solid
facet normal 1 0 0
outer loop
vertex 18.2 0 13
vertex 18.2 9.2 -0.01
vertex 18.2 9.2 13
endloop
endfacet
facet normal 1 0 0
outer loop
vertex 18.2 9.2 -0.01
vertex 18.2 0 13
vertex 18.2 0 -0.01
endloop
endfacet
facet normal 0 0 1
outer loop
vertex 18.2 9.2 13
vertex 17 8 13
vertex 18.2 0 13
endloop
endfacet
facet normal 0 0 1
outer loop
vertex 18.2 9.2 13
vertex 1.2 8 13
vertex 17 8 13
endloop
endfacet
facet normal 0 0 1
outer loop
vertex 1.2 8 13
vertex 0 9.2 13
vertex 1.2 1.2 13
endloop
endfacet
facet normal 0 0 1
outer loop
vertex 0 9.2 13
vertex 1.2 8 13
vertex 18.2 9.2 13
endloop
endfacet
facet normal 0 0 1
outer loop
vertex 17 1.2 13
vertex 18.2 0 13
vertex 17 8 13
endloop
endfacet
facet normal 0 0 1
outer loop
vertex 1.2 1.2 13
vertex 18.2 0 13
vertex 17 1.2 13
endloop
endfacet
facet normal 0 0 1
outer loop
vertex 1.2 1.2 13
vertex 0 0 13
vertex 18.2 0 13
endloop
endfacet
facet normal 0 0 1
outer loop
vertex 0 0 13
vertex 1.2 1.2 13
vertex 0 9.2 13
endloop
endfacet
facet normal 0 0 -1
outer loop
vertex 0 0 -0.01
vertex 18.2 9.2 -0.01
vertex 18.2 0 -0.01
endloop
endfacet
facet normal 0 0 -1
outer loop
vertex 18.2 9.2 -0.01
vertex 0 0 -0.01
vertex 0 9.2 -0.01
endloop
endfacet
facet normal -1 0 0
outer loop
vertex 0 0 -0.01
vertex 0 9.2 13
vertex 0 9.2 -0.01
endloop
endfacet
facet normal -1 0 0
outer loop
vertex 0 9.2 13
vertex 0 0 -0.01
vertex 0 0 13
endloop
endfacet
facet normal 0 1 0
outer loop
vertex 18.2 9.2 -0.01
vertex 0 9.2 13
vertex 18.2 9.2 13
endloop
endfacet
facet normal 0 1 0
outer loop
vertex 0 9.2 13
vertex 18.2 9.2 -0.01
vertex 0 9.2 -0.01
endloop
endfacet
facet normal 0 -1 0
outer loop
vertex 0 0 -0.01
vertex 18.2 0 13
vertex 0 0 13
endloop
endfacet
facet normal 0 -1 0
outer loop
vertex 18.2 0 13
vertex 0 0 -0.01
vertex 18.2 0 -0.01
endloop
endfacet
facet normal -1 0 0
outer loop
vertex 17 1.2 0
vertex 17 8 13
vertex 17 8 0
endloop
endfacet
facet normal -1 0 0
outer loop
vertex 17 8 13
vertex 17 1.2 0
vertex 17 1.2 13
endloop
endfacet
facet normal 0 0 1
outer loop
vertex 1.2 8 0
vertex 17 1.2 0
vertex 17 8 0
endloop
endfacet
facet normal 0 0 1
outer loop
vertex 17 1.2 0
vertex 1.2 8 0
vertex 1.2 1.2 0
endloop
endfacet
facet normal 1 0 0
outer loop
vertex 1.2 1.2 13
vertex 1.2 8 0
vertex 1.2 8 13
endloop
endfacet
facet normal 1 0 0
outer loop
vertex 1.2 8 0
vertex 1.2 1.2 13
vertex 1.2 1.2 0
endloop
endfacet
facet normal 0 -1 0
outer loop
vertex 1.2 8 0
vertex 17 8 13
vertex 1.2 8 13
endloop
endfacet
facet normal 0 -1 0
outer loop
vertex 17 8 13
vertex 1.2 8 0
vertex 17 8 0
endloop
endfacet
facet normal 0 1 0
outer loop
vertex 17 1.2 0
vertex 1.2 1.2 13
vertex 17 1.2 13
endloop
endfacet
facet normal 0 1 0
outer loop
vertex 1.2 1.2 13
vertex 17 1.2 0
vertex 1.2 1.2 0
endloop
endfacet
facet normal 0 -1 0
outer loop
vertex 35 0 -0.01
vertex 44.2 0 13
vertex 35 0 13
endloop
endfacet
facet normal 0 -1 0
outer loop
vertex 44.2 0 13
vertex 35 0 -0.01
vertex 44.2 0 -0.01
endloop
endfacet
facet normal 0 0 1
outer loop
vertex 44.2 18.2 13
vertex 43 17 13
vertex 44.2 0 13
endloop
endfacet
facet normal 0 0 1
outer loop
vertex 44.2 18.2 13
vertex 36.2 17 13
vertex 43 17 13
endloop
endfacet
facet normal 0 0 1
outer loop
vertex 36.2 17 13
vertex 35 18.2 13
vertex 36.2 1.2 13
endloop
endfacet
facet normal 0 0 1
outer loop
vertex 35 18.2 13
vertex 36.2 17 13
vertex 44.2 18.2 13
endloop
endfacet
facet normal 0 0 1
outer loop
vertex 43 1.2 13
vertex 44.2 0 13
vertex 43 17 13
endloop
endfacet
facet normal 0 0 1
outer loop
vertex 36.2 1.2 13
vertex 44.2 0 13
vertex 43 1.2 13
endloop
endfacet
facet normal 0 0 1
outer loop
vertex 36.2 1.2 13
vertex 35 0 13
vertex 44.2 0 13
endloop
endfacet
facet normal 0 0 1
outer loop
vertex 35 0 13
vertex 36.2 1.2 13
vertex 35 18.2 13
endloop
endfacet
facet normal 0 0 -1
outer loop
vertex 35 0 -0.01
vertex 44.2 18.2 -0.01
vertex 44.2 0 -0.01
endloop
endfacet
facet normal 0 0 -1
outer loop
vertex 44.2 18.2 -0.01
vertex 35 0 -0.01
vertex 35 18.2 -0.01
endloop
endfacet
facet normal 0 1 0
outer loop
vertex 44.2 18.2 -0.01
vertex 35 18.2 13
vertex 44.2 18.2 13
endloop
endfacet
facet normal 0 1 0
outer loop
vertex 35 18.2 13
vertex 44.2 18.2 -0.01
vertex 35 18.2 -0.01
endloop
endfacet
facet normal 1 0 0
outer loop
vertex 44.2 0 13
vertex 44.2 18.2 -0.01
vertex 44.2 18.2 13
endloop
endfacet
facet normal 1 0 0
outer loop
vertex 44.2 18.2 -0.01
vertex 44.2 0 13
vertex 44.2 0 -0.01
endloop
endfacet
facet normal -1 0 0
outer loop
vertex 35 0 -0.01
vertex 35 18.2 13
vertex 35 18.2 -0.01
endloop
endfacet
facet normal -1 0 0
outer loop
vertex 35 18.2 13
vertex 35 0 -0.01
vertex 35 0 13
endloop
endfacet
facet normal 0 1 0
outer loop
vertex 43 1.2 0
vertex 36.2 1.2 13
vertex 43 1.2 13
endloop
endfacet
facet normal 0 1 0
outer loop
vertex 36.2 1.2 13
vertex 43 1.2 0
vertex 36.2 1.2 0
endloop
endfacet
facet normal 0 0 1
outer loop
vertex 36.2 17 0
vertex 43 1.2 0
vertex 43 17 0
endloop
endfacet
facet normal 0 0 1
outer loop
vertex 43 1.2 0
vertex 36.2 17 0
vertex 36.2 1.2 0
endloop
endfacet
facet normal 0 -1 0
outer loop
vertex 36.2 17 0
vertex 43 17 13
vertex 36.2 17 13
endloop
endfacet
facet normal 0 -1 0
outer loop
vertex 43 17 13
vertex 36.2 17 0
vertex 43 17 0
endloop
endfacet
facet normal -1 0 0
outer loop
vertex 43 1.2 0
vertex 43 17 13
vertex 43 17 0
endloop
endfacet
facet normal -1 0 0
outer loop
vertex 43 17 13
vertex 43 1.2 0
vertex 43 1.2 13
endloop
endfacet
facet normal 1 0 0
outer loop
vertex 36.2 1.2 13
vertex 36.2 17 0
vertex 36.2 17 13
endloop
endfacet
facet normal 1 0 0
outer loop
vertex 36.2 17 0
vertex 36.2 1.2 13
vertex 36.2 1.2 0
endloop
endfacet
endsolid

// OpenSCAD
// file: ../../Base/Boxes.scad
// Fischertechnik Box Foundation
// Pre-designed Boxes

use <Constants.scad>

include <PlacementOptions.scad>

box190Width = 190;
box190Depth = 130;
box130Width = 130;
box130Depth = 95;
boxUsageHeight = 33.9;
boxWallThickness = 2.4;
boxBaseThickness = 1.0;

// getBoxWallThickness()
// Gets the wall thickness of a Fischertechnik Box

function getBoxWallThickness() = boxWallThickness;

// Gets the usable height of a fischertechnik box
function getBoxUsageHeight() = boxUsageHeight;

// Gets the thickness of the Fischertechnik box base.
function getBoxBaseThickness() = boxBaseThickness;

// Gets the usable inner space of a Box 190 as an x/y-list
function getBox190Space() = [
    box190Width - 2*getBoxWallThickness(), 
    box190Depth - 2*getBoxWallThickness() ];

// Imports the Fischertechnik empty box 130x190 mm and places it at position 0,0
// 190x130 are the outer sizes, the inner space is slightly smaller. Use getBox190Space() to get the inner sizes.
// This module needs the STL file "Fischertechnik Box 130x190.stl" in the library path.
// The box is positioned that the usable inner space is at the 0,0,0 position. The

module Box190() {
    translate([-getBoxWallThickness(),-getBoxWallThickness(),-getBoxBaseThickness()])
        import("Fischertechnik Box 130x190.stl", convexity=3);
}

// Gets the usable inner space of a Box 130 as an x/y-list
function getBox130Space() = [
    box130Width - 2*getBoxWallThickness(), 
    box130Depth - 2*getBoxWallThickness() ];

// Imports the Fischertechnik empty box 95x130 mm and places it at position 0,0
// 190x130 are the outer sizes, the inner space is slightly smaller. Use getBox190Space() to get the inner sizes.
// This module needs the STL file "Fischertechnik Box 95x130.stl" in the library path.
// The box is positioned that the usable inner space is at the 0,0,0 position. The

module Box130() {
    translate([-getBoxWallThickness(),-getBoxWallThickness(),-getBoxBaseThickness()])
        import("Fischertechnik Box 95x130.stl", convexity=3);
}

// Creates a web at the specified box walls
// corner 0 = LowerLeft, 1 = UpperLeft, 2 = UpperRight, 3 = LowerRight
// side 0 = LeftOfCorner, 1 = RightOfCorner
// distance = Distance in mm from the corner
// box = inner width and depth of the box (default: Box 190)
// webWidth = length of the web (default is 3 mms)
// webThickness = thickness of the web (default is 1 mm)

module BoxWeb(corner, side, distance, box=getBox190Space(), webWidth=3, webThickness=1.0) {
    sink = getBoxWallThickness()/2;

    width = (corner % 2 == 0) ? 
            (side == LeftOfCorner ? webWidth : webThickness) :
            (side == LeftOfCorner ? webThickness : webWidth);

    depth = (corner % 2 == 0) ? 
            (side == RightOfCorner ? webWidth : webThickness) :
            (side == RightOfCorner ? webThickness : webWidth);
    
    xDiff = corner == LowerLeft ? 
                (side == LeftOfCorner ? -sink : distance) :
            (corner == UpperLeft ?                
                (side == LeftOfCorner ? distance : -sink) :
            (corner == UpperRight ?
                (side == LeftOfCorner ? box.x-webWidth+sink : box.x-distance-webThickness) :
                (side == LeftOfCorner ? box.x-distance-webThickness: box.x-webWidth+sink)));

    yDiff = corner == LowerLeft ? 
                (side == RightOfCorner ? -sink : distance) :
            (corner == UpperLeft ?
                (side == RightOfCorner ? box.y-distance : box.y-webWidth+sink) :
            (corner == UpperRight ?
                (side == RightOfCorner ? box.y-webWidth+sink : box.y-distance) :
                (side == RightOfCorner ? distance : -sink)));
    
    translate([xDiff, yDiff, -getExcess()])
        cube([width, depth, boxUsageHeight + 2*getExcess()]);
}
// file: ../../Base/Rotation.scad
// Fischertechnik Box Foundation
// Geometry Helpers Rotation

include <PlacementOptions.scad>

// getRotatedSpace(space, rotation=NoRotation)
// Rotates the space dependent on the specified rotation

function getRotatedSpace(space, rotation=NoRotation) = [
    (rotation == Rotate90 || rotation == Rotate270) ? space.y : space.x,
    (rotation == Rotate90 || rotation == Rotate270) ? space.x : space.y
];

// Rotates the given space around the fixed left lower corner
// space = the space the children needs as width/depth list [width,depth]
// rotation = 0 Rotate0 degrees, 1 Rotate90 degrees, 2 Rotate180 degrees, 3 Rotate270 degrees (equivalent to -90)

module RotateFix(space, rotation=Rotate0) {
    dy = (rotation == Rotate0 || rotation == Rotate270) ? 0 :
        (rotation == Rotate90) ? space.x :
        space.y;
    dx = (rotation < Rotate180) ? 0 :
        (rotation == Rotate180) ? space.x :
        space.y;
    
    translate([dx, dy, 0])
        rotate([0, 0, rotations[rotation]])
            children();
}
// file: ../../Base/Alignment.scad
// Fischertechnik Box Foundation
// Geometry Helpers Alignment

include <PlacementOptions.scad>

// getAlignedX(elementWidth, spaceWidth, align=AlignRight, offset=0)
// Gets the aligned X offset of an element with the given
// width in the given space.
// elementWidth = The width of the element to positon
// spaceWidth = The space where the element should be aligned
// align = 0 AlignLeft, 1 AlignCenter, 2 AlignRight
// offset = an optional offset from the aligned position. When
// aligned left or centered, then positive values are in X direction.
// When aligned right then positive values are in negative X direction.

function getAlignedX(elementWidth, spaceWidth, align=AlignRight, offset=0) =
    (align == AlignLeft) ?
        offset :
        ((align == AlignCenter) ?
        (spaceWidth - elementWidth)/2 + offset :
        spaceWidth - offset - elementWidth);

// getAlignedY(elementDepth, spaceDepth, align=AlignTop, offset=0)
// Gets the aligned Y offset of an element with the given
// depth in the given space.
// elementDepth = The depth of the element to positon
// spaceDepth = The space where the element should be aligned
// align = 0 AlignBottom, 1 AlignCenter, 2 AlignTop
// offset = an optional offset from the aligned position. When
// aligned bottom or centered, then positive values are in Y direction.
// When aligned top then positive values are in negative Y direction.

function getAlignedY(elementDepth, spaceDepth, align=AlignTop, offset=0) =
    (align == AlignBottom) ?
        offset :
        ((align == AlignCenter) ?
        (spaceDepth - elementDepth)/2 + offset :
        spaceDepth - offset - elementDepth);
// file: ../../Base/Constants.scad
// Fischertechnik Box Foundation
// Constants

// Constant values necessary for multiple elements

// Base constants
dividerThickness = 1.2;
excess = 0.01;
fragments = 90;
tolerance = 0.8;

// Gets the thickness of a divider 
function getDividerThickness() = dividerThickness;

// Gets the excess that is used to merge walls into each other
function getExcess() = excess;

// Gets amount of fragments of a cylinder
function getFragments() = fragments;

// Gets the inner tolerance of a frame to each side
function getTolerance() = tolerance;


// Fischertechnik specific constants
axisDiameter = 4;
axisBottomDiameter = axisDiameter + 1;
standardEdgeDistance = 2.5;
standardWebDistance = 11.5;
standardCornerLength = 15;
tubeWallFactor = 1.6;

// Gets axis diameter
function getAxisDiameter() = axisDiameter;

// Gets axis bottom diameter for thicker part at the bottom
function getAxisBottomDiameter() = axisBottomDiameter;

// gets the standard distance to the wall of the box for dockable frames with webs
function getStandardEdgeDistance() = standardEdgeDistance;

// gets the standard distance of each web to the corner of the dockable frame
function getStandardWebDistance() = standardWebDistance;

// gets the standard length of the corner walls of a dockable frame
function getStandardCornerLength() = standardCornerLength;

// gets the wall thickness of a tube.
function getTubeWallThickness() = tubeWallFactor * getDividerThickness();
// file: ../../Base/PlacementOptions.scad
// Fischertechnik Box Foundation
// Placement Options

// Alignment
NoAlign = 0;
AlignLeft = 1;
AlignBottom = 2;
AlignCenter = 3;
AlignRight = 4;
AlignTop = 5;

// Element rotation degree steps
rotations = [0, -90, -180, -270];

// Rotation
NoRotation = 0;
Rotate0 = 0;
Rotate90 = 1;
Rotate180 = 2;
Rotate270 = 3;

// Docking (seen from above)
NoDock = -1;
DockLeft = 0;
DockTop = 1;
DockRight = 2;
DockCorner = 2;
DockBottom = 3;

// Web corners
LowerLeft = 0;
UpperLeft = 1;
UpperRight = 2;
LowerRight = 3;

// Web position relative to corner
LeftOfCorner = 0;
RightOfCorner = 1;
// file: ../../Elements/FramePluggedCapacitor.scad
// Fischertechnik Box Library
// Frame for Plugged Capacitor (two plugs)
// 36387

use <../ModelBase/Simple.scad>

width = 15;
depth = 6;
height = 13;

// getFramePluggedCapacitorSpace()
// Gets the space the frame for a plugged capacitor needs as width and depth (.x and .y as a list)

function getFramePluggedCapacitorSpace() = getFrameOuterVolume([width, depth, height]);

// FramePluggedCapacitor()
// The walls of the frame are 13 mm high. 
// The complete frame has a tolerance of addition 1 mm in each direction.

module FramePluggedCapacitor() {
    Frame([width, depth, height]);
}

// Tests
color("lightgray") {
FramePluggedCapacitor();
}
// file: ../../Base/Placement.scad
// Fischertechnik Box Foundation
// Geometry Helpers Placement

use <Constants.scad>
use <Alignment.scad>
use <Rotation.scad>
use <Boxes.scad>

include <PlacementOptions.scad>

// Place(x=0, y=0, elementSpace=[0,0], alignX=AlignLeft, alignY=AlignBottom, rotation=Rotate0, boxSpace=getBox190Space())
// Places the child at the specified position
// y = Y-Position. This is a relative position when an X aligment is specified.
// x = X-Position. This is a relative position when an Y aligment is specified.
// elementSpace = space of the element to be placed [x,y]
// alignX = -1=NoAlign, 0 AlignLeft, 1 AlignCenter, 3 AlignRight (elementSpace and boxSpace required!)
// alignY = -1=NoAlign, 2 AlignBottom, 1 AlignCenter, 4 AlignTop (elementSpace and boxSpace required!)
// rotation = 0 Rotate0 0 degrees, 1 Rotate90 90 degrees, 
// 2 Rotate180 180 degrees, 3 Rotate270 270 degrees (equivalent to -90)
// boxSpace = Inner space of the box where the placement occurs [x,y] - default is Box 190x130 inner space

module Place(x=0, y=0, elementSpace=[0,0], 
  alignX=AlignLeft, alignY=AlignBottom, 
  rotation=NoRotation, boxSpace=getBox190Space()) {

    module Position(x, y, space, rotation=Rotate0) {
        translate([x, y, 0])
            RotateFix(space, rotation)
                children(0);
    }

    space = getRotatedSpace(elementSpace, rotation);
    alignedX = getAlignedX(space.x, boxSpace.x, alignX, x);
    alignedY = getAlignedY(space.y, boxSpace.y, alignY, y);
    Position(alignedX, alignedY, elementSpace, rotation)
        children(0);
}

// Center(space=getBox130Space(), elementSpace=[0,0])
// space = Space where the children is centered. For cylinder use centered=true and no elementSpace.
// elementSpace = space of the element to be centered [x,y]

module Center(space=getBox190Space(), elementSpace=[0,0]) {
    translate([(space.x - elementSpace.x) / 2, (space.y - elementSpace.y) / 2])
        children(0);
}

// CenterHorizontal(width=0, y=0, offset=0, space=getBox130Space())
// space = Space where the children is centered. For cylinder use centered=true and no elementSpace.
// elementSpace = space of the element to be centered [x,y]

module CenterHorizontal(width=0, y=0, offset=0, space=getBox190Space()) {
    translate([(space.x - width) / 2 + offset, y])
        children(0);
}

// CenterVertical(depth=0, x=0, offset=0, space=getBox130Space())
// space = Space where the children is centered. For cylinder use centered=true and no elementSpace.
// elementSpace = space of the element to be centered [x,y]

module CenterVerticalal(depth=0, x=0, offset=0, space=getBox190Space()) {
    translate([x, (space.y - depth) / 2 + offset])
        children(0);
}
// main file
// Fischertechnik Box Foundation
// Elements
// Test FramePluggedCapacitor

use <../../Base/Placement.scad>
use <../../Elements/FramePluggedCapacitor.scad>

include <../../Base/PlacementOptions.scad>

FramePluggedCapacitor();

Place(35, 0, getFramePluggedCapacitorSpace(), rotation=Rotate90)
    FramePluggedCapacitor();
